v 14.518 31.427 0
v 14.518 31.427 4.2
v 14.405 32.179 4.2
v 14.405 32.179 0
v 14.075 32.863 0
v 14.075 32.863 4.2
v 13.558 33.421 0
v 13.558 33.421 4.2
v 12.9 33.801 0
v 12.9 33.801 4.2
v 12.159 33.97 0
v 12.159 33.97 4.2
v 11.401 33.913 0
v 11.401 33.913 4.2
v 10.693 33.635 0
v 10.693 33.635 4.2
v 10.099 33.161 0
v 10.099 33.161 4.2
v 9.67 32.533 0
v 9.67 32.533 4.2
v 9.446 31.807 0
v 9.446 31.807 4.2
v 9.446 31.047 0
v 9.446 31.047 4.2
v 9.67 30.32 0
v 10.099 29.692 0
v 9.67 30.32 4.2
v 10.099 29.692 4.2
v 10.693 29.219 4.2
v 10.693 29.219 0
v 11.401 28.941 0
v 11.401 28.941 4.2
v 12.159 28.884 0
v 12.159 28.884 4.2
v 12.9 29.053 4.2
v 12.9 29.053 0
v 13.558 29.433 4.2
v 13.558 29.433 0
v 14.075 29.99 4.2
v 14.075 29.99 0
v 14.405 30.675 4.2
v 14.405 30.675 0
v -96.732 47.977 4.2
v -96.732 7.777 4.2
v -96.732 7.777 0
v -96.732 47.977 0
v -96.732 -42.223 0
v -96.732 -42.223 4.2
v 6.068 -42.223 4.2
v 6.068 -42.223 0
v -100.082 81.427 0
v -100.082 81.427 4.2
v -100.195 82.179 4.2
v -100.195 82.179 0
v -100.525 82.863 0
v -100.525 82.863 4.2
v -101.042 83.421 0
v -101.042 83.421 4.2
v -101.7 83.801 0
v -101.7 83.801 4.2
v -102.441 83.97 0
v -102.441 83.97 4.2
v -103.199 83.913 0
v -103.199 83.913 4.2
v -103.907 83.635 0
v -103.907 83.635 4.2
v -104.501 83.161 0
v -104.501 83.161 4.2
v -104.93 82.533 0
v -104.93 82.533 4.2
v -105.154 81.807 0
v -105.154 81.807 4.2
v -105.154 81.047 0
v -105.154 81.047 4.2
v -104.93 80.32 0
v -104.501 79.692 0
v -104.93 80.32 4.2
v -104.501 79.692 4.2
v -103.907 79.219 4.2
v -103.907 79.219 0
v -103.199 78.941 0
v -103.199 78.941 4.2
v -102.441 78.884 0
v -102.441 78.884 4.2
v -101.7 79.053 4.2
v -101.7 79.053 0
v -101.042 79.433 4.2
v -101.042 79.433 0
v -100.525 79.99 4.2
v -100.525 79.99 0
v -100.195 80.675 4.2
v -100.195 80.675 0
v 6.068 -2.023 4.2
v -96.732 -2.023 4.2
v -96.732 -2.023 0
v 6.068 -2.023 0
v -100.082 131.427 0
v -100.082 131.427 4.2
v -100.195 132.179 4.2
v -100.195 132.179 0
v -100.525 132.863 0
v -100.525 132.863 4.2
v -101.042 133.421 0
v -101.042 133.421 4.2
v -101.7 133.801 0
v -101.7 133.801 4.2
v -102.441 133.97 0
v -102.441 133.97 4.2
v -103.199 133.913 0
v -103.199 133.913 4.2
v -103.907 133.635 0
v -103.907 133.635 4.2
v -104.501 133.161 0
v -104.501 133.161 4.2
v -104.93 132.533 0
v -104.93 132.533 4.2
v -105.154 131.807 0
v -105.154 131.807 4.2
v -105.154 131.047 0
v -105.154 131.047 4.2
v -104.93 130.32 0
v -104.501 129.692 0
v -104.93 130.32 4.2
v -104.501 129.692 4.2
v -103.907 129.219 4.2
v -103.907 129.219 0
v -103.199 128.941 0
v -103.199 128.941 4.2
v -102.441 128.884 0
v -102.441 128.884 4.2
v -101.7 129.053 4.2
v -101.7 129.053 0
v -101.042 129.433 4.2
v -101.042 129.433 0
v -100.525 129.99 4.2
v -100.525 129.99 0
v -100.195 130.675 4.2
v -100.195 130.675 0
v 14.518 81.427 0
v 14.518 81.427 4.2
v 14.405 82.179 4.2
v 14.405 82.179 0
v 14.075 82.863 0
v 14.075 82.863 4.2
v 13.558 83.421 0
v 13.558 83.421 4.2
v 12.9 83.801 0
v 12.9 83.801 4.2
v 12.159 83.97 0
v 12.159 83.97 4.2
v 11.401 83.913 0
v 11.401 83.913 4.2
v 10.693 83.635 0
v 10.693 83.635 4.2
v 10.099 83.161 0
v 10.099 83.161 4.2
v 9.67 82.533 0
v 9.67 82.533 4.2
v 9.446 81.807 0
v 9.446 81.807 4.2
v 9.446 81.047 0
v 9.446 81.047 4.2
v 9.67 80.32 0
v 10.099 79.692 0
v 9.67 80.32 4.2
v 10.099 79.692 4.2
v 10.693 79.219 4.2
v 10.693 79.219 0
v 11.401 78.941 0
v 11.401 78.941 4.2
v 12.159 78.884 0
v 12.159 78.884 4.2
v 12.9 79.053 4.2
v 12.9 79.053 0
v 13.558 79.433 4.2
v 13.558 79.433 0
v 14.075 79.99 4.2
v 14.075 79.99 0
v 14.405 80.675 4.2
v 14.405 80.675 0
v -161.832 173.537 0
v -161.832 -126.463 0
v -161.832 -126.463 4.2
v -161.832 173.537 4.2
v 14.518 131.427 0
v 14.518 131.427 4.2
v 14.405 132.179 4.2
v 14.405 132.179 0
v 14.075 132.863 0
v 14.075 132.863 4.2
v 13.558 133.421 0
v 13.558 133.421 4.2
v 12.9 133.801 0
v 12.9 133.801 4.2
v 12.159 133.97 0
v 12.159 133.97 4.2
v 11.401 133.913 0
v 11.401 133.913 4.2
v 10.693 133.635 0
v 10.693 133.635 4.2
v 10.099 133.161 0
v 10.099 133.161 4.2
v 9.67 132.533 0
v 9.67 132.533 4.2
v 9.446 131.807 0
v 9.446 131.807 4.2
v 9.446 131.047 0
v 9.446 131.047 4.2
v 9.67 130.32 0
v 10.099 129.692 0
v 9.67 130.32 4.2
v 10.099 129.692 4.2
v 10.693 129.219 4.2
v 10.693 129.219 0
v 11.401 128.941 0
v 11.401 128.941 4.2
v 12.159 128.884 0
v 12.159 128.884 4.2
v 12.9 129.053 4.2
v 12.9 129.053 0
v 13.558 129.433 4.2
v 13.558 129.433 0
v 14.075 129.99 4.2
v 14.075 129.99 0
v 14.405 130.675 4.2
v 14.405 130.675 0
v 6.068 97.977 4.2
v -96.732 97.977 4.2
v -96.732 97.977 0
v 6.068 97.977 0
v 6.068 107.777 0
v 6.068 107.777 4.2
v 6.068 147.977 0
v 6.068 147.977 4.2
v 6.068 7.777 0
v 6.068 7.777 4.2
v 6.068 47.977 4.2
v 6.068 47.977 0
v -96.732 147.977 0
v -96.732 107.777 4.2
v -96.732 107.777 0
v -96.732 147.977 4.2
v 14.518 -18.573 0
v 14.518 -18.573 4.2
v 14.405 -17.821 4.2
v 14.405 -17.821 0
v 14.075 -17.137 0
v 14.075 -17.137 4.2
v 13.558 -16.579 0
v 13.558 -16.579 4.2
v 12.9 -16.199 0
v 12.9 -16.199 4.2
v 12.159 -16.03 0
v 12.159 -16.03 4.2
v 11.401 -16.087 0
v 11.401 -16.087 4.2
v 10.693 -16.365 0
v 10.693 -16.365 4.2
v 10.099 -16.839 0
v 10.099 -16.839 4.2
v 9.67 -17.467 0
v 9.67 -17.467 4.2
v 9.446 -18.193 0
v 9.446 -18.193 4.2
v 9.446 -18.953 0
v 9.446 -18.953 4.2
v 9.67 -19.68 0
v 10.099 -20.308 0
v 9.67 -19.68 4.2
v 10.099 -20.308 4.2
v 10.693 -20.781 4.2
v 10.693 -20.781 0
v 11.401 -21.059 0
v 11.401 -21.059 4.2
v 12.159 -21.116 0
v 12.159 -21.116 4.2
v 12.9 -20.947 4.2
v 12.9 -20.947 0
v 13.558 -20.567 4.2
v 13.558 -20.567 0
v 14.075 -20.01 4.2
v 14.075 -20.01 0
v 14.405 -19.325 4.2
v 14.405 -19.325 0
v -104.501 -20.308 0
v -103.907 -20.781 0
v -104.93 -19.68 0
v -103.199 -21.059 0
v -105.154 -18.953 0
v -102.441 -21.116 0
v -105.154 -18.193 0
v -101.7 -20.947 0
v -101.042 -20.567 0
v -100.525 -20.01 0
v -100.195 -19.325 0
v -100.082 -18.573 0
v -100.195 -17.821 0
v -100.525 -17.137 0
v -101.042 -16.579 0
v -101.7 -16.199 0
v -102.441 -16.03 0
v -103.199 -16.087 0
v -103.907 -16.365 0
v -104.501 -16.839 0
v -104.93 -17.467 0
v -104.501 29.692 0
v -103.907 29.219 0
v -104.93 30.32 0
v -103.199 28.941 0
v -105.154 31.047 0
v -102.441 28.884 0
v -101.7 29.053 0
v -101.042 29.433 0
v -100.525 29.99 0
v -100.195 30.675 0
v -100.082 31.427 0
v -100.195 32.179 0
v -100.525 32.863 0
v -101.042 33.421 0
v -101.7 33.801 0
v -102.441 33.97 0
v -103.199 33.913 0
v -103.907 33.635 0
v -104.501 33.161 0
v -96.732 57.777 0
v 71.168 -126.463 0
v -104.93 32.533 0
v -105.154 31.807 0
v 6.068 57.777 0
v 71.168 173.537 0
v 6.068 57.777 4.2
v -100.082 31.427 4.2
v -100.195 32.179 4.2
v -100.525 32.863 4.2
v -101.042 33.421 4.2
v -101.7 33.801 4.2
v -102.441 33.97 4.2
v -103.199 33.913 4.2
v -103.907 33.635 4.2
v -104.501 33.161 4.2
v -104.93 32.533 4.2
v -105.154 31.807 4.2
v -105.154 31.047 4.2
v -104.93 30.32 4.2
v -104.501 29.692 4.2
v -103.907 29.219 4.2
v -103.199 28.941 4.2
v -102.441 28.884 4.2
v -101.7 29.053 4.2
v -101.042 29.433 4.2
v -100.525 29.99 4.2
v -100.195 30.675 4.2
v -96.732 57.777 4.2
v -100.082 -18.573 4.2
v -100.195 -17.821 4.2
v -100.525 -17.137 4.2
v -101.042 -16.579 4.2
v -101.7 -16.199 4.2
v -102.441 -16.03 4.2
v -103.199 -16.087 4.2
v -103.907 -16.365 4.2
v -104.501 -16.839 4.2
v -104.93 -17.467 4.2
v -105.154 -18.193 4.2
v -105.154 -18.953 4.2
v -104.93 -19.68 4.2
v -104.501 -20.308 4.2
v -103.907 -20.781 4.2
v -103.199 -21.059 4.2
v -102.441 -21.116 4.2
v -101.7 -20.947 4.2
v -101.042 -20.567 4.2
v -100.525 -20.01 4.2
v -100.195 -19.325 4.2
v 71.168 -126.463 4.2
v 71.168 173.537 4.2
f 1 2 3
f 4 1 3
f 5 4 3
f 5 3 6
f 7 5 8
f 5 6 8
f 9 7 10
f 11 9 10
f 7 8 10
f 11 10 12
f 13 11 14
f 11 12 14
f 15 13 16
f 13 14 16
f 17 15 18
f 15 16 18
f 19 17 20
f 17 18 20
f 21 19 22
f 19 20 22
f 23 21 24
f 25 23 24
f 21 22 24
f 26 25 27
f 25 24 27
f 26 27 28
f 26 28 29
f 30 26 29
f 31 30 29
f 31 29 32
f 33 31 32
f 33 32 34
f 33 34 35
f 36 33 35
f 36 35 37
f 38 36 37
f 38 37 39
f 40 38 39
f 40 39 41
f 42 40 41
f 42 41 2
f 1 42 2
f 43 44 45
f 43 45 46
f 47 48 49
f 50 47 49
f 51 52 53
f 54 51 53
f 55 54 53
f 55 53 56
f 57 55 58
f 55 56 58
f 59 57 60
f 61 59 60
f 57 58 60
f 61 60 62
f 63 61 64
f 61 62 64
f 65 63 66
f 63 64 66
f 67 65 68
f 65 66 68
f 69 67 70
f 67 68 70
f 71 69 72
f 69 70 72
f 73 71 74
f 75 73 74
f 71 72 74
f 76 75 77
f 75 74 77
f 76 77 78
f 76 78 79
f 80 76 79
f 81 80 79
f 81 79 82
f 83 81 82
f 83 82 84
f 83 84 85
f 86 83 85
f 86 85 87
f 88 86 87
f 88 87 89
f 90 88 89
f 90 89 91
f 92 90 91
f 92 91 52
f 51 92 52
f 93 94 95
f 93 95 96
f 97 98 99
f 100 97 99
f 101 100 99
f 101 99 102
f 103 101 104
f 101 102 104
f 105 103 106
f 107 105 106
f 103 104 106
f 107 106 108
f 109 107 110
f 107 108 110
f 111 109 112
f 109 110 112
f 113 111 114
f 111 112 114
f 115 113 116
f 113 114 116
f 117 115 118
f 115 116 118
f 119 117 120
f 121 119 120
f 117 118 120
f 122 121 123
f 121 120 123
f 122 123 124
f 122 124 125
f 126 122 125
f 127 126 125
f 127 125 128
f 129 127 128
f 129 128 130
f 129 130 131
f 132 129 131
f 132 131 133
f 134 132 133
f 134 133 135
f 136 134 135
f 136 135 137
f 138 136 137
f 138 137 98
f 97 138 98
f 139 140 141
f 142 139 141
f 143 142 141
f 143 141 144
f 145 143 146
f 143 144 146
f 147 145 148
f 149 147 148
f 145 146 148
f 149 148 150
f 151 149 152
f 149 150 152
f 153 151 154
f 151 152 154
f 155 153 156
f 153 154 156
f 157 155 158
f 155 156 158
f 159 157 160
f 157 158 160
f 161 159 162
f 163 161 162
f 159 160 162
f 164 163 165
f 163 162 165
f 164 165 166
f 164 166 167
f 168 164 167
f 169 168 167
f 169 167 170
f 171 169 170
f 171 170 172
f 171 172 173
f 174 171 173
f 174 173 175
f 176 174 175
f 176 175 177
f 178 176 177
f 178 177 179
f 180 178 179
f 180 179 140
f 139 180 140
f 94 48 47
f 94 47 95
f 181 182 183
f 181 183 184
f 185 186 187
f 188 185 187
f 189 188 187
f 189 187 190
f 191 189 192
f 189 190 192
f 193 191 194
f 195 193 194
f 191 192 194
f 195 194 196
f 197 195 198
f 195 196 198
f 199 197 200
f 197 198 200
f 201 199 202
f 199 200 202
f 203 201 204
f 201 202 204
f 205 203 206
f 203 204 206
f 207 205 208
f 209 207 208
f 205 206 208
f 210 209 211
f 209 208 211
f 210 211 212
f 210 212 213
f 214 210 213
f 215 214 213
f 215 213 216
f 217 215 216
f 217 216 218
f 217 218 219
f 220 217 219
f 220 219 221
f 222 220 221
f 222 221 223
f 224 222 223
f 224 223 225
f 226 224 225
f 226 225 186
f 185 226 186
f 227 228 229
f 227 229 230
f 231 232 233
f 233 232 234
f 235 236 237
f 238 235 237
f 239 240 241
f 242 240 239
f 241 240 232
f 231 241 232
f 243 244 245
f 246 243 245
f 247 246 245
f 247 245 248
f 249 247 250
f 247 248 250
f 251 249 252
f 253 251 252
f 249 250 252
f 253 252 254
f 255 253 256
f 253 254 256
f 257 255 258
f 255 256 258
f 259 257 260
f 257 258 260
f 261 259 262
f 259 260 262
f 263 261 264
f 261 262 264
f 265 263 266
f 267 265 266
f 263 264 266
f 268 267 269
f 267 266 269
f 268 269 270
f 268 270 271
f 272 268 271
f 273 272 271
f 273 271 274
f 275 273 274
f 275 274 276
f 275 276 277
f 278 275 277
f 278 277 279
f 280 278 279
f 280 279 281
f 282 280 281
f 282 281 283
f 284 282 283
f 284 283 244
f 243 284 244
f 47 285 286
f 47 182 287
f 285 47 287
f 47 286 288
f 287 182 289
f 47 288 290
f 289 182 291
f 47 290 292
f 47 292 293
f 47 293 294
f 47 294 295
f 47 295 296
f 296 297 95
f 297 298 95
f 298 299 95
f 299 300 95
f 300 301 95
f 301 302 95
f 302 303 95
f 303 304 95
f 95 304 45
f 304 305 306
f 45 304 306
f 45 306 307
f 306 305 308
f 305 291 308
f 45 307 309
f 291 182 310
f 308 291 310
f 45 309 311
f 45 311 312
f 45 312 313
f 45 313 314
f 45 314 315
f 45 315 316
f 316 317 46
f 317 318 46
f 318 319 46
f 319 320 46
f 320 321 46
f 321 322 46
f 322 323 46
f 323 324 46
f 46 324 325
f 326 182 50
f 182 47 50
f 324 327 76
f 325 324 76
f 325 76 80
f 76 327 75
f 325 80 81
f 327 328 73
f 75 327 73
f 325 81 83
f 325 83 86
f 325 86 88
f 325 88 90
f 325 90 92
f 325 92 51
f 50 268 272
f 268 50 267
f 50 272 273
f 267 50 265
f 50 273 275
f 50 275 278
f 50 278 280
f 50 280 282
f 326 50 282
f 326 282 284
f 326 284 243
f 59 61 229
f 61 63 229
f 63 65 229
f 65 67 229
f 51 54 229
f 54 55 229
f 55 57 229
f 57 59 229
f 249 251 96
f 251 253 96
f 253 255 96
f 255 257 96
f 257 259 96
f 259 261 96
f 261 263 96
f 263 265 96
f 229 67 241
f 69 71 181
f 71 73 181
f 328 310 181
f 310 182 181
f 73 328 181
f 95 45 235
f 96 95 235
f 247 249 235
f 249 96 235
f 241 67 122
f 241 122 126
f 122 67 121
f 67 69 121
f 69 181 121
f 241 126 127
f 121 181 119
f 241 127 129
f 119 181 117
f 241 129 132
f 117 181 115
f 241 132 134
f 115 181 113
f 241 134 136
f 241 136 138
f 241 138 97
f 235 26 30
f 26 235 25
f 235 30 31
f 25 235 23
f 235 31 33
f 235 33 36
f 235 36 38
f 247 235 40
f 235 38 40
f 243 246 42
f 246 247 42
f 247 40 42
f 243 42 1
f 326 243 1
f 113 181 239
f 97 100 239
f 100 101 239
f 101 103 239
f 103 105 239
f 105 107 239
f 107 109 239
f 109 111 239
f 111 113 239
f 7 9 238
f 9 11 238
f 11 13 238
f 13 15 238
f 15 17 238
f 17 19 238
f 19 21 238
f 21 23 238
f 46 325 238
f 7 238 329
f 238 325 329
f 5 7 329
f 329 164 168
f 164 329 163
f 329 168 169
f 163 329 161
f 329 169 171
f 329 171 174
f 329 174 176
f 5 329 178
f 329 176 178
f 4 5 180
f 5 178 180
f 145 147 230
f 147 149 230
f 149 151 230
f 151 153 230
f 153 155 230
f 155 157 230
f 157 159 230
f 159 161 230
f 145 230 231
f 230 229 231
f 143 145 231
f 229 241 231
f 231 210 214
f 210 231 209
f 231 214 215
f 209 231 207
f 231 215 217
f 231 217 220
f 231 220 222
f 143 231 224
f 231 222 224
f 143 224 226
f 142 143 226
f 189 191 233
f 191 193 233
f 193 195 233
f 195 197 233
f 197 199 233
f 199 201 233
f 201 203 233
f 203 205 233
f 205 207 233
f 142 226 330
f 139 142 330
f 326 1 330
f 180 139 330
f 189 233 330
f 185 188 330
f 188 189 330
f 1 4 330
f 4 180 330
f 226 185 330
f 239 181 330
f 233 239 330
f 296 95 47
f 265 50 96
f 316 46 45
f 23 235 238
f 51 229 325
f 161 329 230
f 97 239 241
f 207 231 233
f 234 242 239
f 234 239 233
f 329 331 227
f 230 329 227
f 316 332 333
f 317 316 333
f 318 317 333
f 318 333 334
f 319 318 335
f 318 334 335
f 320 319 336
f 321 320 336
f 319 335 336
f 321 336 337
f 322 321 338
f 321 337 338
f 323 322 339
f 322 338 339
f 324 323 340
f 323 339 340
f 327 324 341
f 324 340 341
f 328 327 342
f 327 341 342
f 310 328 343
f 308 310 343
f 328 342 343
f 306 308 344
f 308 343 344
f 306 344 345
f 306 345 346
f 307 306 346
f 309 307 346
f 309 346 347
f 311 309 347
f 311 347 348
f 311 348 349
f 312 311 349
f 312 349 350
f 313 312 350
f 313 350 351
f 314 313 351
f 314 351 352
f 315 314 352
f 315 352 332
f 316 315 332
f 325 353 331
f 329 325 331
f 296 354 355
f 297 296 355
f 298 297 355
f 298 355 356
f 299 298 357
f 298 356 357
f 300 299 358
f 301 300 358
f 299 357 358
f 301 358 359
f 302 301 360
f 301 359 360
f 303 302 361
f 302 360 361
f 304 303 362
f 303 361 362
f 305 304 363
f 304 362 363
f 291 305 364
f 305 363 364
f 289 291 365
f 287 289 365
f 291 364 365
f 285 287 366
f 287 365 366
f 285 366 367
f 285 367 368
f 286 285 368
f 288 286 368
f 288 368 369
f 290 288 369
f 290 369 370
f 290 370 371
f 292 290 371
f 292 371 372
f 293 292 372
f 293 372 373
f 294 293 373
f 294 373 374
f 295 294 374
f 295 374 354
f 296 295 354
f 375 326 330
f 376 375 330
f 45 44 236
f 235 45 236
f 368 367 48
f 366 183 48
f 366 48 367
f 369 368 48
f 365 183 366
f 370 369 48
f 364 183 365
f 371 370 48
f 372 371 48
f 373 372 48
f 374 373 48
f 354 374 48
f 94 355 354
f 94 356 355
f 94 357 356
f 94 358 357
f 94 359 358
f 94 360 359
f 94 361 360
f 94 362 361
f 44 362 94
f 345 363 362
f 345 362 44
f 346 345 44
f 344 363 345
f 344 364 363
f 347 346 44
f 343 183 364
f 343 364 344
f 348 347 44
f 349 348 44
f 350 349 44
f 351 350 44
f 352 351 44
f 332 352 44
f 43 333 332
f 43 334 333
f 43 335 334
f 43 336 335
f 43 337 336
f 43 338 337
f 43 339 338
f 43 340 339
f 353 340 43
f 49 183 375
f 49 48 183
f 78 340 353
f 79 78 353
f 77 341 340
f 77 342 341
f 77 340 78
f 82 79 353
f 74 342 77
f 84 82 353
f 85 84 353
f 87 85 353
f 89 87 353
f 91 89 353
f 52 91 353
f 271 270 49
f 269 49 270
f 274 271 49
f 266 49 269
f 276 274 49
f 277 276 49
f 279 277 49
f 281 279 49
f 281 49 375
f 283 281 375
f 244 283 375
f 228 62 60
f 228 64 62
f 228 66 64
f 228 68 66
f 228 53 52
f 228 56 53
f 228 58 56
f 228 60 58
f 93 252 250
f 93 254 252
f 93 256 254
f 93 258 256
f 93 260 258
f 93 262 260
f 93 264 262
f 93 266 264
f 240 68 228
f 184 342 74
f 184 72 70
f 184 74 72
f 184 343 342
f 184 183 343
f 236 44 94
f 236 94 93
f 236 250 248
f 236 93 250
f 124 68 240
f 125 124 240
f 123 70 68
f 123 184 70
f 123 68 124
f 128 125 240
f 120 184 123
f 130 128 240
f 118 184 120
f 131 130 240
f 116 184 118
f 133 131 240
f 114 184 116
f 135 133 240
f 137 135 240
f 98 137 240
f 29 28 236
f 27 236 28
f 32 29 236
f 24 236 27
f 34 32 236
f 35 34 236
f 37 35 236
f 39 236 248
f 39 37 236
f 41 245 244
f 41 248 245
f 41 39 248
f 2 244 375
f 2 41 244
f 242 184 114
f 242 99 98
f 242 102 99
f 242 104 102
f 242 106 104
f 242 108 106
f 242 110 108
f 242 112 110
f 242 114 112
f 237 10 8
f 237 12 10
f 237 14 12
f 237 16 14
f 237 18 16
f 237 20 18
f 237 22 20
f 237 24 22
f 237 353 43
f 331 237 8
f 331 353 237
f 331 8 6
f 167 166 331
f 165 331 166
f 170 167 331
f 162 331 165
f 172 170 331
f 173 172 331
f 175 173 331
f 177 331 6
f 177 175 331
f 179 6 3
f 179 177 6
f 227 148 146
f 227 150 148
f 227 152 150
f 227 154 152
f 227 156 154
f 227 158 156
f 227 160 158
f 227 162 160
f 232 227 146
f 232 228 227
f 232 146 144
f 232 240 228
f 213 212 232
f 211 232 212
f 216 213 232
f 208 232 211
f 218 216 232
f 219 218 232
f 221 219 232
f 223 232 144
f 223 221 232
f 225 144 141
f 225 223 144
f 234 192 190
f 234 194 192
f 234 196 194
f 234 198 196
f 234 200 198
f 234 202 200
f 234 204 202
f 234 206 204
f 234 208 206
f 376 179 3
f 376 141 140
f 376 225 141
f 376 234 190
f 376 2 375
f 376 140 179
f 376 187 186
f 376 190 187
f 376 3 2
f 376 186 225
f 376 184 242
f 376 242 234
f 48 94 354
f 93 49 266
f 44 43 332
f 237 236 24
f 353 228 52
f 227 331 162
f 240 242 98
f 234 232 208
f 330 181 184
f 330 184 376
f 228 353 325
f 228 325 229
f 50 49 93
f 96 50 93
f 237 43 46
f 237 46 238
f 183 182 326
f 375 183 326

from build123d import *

# Parameters (mm, degrees)
ESQUISSE1_W                  = 233
ESQUISSE1_H                  = 300
BOSS_EXTRU_1_DEPTH           = 4.2
ESQUISSE2_R                  = 2.55
ESQUISSE2_W                  = 102.8
ESQUISSE2_H                  = 40.2
ENL_V_MAT_EXTRU_1_DEPTH      = 1
ENL_V_MAT_EXTRU_1_DEPTH_BACK = 5.2


with BuildPart() as part:
    # Esquisse1 → Boss.-Extru.1 (new body)
    with BuildSketch(Plane.XY):
        with Locations((-45.332061069, 23.536895674)):
            Rectangle(ESQUISSE1_W, ESQUISSE1_H)
    extrude(amount=BOSS_EXTRU_1_DEPTH)

    # Esquisse2 → Enlèv. mat.-Extru.1 (cut, two sides)
    with BuildSketch(Plane.XY.offset(4.2)) as enl_v_mat_extru_1_sk:
        with Locations((-102.632061069, 131.426895674)):
            Circle(ESQUISSE2_R)
        with Locations((11.967938931, 131.426895674)):
            Circle(ESQUISSE2_R)
        with Locations((-102.632061069, 81.426895674)):
            Circle(ESQUISSE2_R)
        with Locations((11.967938931, 81.426895674)):
            Circle(ESQUISSE2_R)
        with Locations((-102.632061069, 31.426895674)):
            Circle(ESQUISSE2_R)
        with Locations((11.967938931, 31.426895674)):
            Circle(ESQUISSE2_R)
        with Locations((-102.632061069, -18.573104326)):
            Circle(ESQUISSE2_R)
        with Locations((11.967938931, -18.573104326)):
            Circle(ESQUISSE2_R)
        with Locations((-45.332061069, -22.123104326)):
            Rectangle(ESQUISSE2_W, ESQUISSE2_H)
        with Locations((-45.332061069, 27.876895674)):
            Rectangle(ESQUISSE2_W, ESQUISSE2_H)
        with Locations((-45.332061069, 77.876895674)):
            Rectangle(ESQUISSE2_W, ESQUISSE2_H)
        with Locations((-45.332061069, 127.876895674)):
            Rectangle(ESQUISSE2_W, ESQUISSE2_H)
    extrude(amount=ENL_V_MAT_EXTRU_1_DEPTH, mode=Mode.SUBTRACT)
    extrude(enl_v_mat_extru_1_sk.sketch, amount=-ENL_V_MAT_EXTRU_1_DEPTH_BACK, mode=Mode.SUBTRACT)


solid = part.part
